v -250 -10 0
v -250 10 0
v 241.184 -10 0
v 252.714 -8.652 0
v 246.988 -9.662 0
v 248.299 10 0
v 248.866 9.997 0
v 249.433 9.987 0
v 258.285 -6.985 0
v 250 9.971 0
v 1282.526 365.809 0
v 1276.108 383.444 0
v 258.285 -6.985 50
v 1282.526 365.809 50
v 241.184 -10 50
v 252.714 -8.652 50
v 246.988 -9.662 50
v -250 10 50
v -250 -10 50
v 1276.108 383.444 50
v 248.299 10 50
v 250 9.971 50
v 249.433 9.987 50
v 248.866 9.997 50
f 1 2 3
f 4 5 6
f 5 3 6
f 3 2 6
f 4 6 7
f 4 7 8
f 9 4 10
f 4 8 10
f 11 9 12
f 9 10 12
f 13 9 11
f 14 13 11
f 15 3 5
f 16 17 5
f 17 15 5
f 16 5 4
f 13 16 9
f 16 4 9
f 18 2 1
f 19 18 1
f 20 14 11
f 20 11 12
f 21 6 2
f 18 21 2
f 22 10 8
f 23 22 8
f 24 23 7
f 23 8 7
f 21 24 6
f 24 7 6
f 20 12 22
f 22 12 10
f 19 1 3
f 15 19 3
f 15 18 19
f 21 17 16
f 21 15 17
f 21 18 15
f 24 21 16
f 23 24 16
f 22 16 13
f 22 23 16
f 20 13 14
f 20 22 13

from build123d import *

# Parameters (mm, degrees)
DODANIE_WYCI_GNI_CIE1_DEPTH = 50
ZAOKR_GLENIE1_R             = 50


with BuildPart() as part:
    # Szkic1 → Dodanie-wyciągnięcie1 (new body)
    with BuildSketch(Plane.XY):
        Polygon((-250, -10), (250, -10), (1282.526348129, 365.808856814), (1276.107770084, 383.443755056), (250, 9.971069596), (250, 10), (-250, 10), align=None)
    extrude(amount=DODANIE_WYCI_GNI_CIE1_DEPTH)

    # Zaokrąglenie1
    # the kernel refuses this fillet: 50 mm, written as the material it takes off along each edge
    with BuildSketch(Plane(origin=(250, 10, -4.251619831), x_dir=(0, -1, 0), z_dir=(0, 0, 1))) as zaokr_glenie1_piece_1:
        with BuildLine():
            CenterArc((50, -1.700647932), ZAOKR_GLENIE1_R, 178.05082507, 1.94917493)
            Line((0, -1.700647932), (0, 0))
            Line((0, 0), (0.028930404, 0))
        make_face()
    extrude(amount=58.503239662, mode=Mode.SUBTRACT)
    with BuildSketch(Plane(origin=(250, -10, -22.040872589), x_dir=(-1, 0, 0), z_dir=(0, 0, 1))) as zaokr_glenie1_piece_2:
        with BuildLine():
            CenterArc((ZAOKR_GLENIE1_R * 0.176326980708, -ZAOKR_GLENIE1_R), ZAOKR_GLENIE1_R, 90, 20)
            Line((-ZAOKR_GLENIE1_R * 0.165693162617, -ZAOKR_GLENIE1_R * 0.0603073792141), (0, 0))
            Line((0, 0), (ZAOKR_GLENIE1_R * 0.176326980708, 0))
        make_face()
    extrude(amount=94.081745177, mode=Mode.SUBTRACT)


solid = part.part
